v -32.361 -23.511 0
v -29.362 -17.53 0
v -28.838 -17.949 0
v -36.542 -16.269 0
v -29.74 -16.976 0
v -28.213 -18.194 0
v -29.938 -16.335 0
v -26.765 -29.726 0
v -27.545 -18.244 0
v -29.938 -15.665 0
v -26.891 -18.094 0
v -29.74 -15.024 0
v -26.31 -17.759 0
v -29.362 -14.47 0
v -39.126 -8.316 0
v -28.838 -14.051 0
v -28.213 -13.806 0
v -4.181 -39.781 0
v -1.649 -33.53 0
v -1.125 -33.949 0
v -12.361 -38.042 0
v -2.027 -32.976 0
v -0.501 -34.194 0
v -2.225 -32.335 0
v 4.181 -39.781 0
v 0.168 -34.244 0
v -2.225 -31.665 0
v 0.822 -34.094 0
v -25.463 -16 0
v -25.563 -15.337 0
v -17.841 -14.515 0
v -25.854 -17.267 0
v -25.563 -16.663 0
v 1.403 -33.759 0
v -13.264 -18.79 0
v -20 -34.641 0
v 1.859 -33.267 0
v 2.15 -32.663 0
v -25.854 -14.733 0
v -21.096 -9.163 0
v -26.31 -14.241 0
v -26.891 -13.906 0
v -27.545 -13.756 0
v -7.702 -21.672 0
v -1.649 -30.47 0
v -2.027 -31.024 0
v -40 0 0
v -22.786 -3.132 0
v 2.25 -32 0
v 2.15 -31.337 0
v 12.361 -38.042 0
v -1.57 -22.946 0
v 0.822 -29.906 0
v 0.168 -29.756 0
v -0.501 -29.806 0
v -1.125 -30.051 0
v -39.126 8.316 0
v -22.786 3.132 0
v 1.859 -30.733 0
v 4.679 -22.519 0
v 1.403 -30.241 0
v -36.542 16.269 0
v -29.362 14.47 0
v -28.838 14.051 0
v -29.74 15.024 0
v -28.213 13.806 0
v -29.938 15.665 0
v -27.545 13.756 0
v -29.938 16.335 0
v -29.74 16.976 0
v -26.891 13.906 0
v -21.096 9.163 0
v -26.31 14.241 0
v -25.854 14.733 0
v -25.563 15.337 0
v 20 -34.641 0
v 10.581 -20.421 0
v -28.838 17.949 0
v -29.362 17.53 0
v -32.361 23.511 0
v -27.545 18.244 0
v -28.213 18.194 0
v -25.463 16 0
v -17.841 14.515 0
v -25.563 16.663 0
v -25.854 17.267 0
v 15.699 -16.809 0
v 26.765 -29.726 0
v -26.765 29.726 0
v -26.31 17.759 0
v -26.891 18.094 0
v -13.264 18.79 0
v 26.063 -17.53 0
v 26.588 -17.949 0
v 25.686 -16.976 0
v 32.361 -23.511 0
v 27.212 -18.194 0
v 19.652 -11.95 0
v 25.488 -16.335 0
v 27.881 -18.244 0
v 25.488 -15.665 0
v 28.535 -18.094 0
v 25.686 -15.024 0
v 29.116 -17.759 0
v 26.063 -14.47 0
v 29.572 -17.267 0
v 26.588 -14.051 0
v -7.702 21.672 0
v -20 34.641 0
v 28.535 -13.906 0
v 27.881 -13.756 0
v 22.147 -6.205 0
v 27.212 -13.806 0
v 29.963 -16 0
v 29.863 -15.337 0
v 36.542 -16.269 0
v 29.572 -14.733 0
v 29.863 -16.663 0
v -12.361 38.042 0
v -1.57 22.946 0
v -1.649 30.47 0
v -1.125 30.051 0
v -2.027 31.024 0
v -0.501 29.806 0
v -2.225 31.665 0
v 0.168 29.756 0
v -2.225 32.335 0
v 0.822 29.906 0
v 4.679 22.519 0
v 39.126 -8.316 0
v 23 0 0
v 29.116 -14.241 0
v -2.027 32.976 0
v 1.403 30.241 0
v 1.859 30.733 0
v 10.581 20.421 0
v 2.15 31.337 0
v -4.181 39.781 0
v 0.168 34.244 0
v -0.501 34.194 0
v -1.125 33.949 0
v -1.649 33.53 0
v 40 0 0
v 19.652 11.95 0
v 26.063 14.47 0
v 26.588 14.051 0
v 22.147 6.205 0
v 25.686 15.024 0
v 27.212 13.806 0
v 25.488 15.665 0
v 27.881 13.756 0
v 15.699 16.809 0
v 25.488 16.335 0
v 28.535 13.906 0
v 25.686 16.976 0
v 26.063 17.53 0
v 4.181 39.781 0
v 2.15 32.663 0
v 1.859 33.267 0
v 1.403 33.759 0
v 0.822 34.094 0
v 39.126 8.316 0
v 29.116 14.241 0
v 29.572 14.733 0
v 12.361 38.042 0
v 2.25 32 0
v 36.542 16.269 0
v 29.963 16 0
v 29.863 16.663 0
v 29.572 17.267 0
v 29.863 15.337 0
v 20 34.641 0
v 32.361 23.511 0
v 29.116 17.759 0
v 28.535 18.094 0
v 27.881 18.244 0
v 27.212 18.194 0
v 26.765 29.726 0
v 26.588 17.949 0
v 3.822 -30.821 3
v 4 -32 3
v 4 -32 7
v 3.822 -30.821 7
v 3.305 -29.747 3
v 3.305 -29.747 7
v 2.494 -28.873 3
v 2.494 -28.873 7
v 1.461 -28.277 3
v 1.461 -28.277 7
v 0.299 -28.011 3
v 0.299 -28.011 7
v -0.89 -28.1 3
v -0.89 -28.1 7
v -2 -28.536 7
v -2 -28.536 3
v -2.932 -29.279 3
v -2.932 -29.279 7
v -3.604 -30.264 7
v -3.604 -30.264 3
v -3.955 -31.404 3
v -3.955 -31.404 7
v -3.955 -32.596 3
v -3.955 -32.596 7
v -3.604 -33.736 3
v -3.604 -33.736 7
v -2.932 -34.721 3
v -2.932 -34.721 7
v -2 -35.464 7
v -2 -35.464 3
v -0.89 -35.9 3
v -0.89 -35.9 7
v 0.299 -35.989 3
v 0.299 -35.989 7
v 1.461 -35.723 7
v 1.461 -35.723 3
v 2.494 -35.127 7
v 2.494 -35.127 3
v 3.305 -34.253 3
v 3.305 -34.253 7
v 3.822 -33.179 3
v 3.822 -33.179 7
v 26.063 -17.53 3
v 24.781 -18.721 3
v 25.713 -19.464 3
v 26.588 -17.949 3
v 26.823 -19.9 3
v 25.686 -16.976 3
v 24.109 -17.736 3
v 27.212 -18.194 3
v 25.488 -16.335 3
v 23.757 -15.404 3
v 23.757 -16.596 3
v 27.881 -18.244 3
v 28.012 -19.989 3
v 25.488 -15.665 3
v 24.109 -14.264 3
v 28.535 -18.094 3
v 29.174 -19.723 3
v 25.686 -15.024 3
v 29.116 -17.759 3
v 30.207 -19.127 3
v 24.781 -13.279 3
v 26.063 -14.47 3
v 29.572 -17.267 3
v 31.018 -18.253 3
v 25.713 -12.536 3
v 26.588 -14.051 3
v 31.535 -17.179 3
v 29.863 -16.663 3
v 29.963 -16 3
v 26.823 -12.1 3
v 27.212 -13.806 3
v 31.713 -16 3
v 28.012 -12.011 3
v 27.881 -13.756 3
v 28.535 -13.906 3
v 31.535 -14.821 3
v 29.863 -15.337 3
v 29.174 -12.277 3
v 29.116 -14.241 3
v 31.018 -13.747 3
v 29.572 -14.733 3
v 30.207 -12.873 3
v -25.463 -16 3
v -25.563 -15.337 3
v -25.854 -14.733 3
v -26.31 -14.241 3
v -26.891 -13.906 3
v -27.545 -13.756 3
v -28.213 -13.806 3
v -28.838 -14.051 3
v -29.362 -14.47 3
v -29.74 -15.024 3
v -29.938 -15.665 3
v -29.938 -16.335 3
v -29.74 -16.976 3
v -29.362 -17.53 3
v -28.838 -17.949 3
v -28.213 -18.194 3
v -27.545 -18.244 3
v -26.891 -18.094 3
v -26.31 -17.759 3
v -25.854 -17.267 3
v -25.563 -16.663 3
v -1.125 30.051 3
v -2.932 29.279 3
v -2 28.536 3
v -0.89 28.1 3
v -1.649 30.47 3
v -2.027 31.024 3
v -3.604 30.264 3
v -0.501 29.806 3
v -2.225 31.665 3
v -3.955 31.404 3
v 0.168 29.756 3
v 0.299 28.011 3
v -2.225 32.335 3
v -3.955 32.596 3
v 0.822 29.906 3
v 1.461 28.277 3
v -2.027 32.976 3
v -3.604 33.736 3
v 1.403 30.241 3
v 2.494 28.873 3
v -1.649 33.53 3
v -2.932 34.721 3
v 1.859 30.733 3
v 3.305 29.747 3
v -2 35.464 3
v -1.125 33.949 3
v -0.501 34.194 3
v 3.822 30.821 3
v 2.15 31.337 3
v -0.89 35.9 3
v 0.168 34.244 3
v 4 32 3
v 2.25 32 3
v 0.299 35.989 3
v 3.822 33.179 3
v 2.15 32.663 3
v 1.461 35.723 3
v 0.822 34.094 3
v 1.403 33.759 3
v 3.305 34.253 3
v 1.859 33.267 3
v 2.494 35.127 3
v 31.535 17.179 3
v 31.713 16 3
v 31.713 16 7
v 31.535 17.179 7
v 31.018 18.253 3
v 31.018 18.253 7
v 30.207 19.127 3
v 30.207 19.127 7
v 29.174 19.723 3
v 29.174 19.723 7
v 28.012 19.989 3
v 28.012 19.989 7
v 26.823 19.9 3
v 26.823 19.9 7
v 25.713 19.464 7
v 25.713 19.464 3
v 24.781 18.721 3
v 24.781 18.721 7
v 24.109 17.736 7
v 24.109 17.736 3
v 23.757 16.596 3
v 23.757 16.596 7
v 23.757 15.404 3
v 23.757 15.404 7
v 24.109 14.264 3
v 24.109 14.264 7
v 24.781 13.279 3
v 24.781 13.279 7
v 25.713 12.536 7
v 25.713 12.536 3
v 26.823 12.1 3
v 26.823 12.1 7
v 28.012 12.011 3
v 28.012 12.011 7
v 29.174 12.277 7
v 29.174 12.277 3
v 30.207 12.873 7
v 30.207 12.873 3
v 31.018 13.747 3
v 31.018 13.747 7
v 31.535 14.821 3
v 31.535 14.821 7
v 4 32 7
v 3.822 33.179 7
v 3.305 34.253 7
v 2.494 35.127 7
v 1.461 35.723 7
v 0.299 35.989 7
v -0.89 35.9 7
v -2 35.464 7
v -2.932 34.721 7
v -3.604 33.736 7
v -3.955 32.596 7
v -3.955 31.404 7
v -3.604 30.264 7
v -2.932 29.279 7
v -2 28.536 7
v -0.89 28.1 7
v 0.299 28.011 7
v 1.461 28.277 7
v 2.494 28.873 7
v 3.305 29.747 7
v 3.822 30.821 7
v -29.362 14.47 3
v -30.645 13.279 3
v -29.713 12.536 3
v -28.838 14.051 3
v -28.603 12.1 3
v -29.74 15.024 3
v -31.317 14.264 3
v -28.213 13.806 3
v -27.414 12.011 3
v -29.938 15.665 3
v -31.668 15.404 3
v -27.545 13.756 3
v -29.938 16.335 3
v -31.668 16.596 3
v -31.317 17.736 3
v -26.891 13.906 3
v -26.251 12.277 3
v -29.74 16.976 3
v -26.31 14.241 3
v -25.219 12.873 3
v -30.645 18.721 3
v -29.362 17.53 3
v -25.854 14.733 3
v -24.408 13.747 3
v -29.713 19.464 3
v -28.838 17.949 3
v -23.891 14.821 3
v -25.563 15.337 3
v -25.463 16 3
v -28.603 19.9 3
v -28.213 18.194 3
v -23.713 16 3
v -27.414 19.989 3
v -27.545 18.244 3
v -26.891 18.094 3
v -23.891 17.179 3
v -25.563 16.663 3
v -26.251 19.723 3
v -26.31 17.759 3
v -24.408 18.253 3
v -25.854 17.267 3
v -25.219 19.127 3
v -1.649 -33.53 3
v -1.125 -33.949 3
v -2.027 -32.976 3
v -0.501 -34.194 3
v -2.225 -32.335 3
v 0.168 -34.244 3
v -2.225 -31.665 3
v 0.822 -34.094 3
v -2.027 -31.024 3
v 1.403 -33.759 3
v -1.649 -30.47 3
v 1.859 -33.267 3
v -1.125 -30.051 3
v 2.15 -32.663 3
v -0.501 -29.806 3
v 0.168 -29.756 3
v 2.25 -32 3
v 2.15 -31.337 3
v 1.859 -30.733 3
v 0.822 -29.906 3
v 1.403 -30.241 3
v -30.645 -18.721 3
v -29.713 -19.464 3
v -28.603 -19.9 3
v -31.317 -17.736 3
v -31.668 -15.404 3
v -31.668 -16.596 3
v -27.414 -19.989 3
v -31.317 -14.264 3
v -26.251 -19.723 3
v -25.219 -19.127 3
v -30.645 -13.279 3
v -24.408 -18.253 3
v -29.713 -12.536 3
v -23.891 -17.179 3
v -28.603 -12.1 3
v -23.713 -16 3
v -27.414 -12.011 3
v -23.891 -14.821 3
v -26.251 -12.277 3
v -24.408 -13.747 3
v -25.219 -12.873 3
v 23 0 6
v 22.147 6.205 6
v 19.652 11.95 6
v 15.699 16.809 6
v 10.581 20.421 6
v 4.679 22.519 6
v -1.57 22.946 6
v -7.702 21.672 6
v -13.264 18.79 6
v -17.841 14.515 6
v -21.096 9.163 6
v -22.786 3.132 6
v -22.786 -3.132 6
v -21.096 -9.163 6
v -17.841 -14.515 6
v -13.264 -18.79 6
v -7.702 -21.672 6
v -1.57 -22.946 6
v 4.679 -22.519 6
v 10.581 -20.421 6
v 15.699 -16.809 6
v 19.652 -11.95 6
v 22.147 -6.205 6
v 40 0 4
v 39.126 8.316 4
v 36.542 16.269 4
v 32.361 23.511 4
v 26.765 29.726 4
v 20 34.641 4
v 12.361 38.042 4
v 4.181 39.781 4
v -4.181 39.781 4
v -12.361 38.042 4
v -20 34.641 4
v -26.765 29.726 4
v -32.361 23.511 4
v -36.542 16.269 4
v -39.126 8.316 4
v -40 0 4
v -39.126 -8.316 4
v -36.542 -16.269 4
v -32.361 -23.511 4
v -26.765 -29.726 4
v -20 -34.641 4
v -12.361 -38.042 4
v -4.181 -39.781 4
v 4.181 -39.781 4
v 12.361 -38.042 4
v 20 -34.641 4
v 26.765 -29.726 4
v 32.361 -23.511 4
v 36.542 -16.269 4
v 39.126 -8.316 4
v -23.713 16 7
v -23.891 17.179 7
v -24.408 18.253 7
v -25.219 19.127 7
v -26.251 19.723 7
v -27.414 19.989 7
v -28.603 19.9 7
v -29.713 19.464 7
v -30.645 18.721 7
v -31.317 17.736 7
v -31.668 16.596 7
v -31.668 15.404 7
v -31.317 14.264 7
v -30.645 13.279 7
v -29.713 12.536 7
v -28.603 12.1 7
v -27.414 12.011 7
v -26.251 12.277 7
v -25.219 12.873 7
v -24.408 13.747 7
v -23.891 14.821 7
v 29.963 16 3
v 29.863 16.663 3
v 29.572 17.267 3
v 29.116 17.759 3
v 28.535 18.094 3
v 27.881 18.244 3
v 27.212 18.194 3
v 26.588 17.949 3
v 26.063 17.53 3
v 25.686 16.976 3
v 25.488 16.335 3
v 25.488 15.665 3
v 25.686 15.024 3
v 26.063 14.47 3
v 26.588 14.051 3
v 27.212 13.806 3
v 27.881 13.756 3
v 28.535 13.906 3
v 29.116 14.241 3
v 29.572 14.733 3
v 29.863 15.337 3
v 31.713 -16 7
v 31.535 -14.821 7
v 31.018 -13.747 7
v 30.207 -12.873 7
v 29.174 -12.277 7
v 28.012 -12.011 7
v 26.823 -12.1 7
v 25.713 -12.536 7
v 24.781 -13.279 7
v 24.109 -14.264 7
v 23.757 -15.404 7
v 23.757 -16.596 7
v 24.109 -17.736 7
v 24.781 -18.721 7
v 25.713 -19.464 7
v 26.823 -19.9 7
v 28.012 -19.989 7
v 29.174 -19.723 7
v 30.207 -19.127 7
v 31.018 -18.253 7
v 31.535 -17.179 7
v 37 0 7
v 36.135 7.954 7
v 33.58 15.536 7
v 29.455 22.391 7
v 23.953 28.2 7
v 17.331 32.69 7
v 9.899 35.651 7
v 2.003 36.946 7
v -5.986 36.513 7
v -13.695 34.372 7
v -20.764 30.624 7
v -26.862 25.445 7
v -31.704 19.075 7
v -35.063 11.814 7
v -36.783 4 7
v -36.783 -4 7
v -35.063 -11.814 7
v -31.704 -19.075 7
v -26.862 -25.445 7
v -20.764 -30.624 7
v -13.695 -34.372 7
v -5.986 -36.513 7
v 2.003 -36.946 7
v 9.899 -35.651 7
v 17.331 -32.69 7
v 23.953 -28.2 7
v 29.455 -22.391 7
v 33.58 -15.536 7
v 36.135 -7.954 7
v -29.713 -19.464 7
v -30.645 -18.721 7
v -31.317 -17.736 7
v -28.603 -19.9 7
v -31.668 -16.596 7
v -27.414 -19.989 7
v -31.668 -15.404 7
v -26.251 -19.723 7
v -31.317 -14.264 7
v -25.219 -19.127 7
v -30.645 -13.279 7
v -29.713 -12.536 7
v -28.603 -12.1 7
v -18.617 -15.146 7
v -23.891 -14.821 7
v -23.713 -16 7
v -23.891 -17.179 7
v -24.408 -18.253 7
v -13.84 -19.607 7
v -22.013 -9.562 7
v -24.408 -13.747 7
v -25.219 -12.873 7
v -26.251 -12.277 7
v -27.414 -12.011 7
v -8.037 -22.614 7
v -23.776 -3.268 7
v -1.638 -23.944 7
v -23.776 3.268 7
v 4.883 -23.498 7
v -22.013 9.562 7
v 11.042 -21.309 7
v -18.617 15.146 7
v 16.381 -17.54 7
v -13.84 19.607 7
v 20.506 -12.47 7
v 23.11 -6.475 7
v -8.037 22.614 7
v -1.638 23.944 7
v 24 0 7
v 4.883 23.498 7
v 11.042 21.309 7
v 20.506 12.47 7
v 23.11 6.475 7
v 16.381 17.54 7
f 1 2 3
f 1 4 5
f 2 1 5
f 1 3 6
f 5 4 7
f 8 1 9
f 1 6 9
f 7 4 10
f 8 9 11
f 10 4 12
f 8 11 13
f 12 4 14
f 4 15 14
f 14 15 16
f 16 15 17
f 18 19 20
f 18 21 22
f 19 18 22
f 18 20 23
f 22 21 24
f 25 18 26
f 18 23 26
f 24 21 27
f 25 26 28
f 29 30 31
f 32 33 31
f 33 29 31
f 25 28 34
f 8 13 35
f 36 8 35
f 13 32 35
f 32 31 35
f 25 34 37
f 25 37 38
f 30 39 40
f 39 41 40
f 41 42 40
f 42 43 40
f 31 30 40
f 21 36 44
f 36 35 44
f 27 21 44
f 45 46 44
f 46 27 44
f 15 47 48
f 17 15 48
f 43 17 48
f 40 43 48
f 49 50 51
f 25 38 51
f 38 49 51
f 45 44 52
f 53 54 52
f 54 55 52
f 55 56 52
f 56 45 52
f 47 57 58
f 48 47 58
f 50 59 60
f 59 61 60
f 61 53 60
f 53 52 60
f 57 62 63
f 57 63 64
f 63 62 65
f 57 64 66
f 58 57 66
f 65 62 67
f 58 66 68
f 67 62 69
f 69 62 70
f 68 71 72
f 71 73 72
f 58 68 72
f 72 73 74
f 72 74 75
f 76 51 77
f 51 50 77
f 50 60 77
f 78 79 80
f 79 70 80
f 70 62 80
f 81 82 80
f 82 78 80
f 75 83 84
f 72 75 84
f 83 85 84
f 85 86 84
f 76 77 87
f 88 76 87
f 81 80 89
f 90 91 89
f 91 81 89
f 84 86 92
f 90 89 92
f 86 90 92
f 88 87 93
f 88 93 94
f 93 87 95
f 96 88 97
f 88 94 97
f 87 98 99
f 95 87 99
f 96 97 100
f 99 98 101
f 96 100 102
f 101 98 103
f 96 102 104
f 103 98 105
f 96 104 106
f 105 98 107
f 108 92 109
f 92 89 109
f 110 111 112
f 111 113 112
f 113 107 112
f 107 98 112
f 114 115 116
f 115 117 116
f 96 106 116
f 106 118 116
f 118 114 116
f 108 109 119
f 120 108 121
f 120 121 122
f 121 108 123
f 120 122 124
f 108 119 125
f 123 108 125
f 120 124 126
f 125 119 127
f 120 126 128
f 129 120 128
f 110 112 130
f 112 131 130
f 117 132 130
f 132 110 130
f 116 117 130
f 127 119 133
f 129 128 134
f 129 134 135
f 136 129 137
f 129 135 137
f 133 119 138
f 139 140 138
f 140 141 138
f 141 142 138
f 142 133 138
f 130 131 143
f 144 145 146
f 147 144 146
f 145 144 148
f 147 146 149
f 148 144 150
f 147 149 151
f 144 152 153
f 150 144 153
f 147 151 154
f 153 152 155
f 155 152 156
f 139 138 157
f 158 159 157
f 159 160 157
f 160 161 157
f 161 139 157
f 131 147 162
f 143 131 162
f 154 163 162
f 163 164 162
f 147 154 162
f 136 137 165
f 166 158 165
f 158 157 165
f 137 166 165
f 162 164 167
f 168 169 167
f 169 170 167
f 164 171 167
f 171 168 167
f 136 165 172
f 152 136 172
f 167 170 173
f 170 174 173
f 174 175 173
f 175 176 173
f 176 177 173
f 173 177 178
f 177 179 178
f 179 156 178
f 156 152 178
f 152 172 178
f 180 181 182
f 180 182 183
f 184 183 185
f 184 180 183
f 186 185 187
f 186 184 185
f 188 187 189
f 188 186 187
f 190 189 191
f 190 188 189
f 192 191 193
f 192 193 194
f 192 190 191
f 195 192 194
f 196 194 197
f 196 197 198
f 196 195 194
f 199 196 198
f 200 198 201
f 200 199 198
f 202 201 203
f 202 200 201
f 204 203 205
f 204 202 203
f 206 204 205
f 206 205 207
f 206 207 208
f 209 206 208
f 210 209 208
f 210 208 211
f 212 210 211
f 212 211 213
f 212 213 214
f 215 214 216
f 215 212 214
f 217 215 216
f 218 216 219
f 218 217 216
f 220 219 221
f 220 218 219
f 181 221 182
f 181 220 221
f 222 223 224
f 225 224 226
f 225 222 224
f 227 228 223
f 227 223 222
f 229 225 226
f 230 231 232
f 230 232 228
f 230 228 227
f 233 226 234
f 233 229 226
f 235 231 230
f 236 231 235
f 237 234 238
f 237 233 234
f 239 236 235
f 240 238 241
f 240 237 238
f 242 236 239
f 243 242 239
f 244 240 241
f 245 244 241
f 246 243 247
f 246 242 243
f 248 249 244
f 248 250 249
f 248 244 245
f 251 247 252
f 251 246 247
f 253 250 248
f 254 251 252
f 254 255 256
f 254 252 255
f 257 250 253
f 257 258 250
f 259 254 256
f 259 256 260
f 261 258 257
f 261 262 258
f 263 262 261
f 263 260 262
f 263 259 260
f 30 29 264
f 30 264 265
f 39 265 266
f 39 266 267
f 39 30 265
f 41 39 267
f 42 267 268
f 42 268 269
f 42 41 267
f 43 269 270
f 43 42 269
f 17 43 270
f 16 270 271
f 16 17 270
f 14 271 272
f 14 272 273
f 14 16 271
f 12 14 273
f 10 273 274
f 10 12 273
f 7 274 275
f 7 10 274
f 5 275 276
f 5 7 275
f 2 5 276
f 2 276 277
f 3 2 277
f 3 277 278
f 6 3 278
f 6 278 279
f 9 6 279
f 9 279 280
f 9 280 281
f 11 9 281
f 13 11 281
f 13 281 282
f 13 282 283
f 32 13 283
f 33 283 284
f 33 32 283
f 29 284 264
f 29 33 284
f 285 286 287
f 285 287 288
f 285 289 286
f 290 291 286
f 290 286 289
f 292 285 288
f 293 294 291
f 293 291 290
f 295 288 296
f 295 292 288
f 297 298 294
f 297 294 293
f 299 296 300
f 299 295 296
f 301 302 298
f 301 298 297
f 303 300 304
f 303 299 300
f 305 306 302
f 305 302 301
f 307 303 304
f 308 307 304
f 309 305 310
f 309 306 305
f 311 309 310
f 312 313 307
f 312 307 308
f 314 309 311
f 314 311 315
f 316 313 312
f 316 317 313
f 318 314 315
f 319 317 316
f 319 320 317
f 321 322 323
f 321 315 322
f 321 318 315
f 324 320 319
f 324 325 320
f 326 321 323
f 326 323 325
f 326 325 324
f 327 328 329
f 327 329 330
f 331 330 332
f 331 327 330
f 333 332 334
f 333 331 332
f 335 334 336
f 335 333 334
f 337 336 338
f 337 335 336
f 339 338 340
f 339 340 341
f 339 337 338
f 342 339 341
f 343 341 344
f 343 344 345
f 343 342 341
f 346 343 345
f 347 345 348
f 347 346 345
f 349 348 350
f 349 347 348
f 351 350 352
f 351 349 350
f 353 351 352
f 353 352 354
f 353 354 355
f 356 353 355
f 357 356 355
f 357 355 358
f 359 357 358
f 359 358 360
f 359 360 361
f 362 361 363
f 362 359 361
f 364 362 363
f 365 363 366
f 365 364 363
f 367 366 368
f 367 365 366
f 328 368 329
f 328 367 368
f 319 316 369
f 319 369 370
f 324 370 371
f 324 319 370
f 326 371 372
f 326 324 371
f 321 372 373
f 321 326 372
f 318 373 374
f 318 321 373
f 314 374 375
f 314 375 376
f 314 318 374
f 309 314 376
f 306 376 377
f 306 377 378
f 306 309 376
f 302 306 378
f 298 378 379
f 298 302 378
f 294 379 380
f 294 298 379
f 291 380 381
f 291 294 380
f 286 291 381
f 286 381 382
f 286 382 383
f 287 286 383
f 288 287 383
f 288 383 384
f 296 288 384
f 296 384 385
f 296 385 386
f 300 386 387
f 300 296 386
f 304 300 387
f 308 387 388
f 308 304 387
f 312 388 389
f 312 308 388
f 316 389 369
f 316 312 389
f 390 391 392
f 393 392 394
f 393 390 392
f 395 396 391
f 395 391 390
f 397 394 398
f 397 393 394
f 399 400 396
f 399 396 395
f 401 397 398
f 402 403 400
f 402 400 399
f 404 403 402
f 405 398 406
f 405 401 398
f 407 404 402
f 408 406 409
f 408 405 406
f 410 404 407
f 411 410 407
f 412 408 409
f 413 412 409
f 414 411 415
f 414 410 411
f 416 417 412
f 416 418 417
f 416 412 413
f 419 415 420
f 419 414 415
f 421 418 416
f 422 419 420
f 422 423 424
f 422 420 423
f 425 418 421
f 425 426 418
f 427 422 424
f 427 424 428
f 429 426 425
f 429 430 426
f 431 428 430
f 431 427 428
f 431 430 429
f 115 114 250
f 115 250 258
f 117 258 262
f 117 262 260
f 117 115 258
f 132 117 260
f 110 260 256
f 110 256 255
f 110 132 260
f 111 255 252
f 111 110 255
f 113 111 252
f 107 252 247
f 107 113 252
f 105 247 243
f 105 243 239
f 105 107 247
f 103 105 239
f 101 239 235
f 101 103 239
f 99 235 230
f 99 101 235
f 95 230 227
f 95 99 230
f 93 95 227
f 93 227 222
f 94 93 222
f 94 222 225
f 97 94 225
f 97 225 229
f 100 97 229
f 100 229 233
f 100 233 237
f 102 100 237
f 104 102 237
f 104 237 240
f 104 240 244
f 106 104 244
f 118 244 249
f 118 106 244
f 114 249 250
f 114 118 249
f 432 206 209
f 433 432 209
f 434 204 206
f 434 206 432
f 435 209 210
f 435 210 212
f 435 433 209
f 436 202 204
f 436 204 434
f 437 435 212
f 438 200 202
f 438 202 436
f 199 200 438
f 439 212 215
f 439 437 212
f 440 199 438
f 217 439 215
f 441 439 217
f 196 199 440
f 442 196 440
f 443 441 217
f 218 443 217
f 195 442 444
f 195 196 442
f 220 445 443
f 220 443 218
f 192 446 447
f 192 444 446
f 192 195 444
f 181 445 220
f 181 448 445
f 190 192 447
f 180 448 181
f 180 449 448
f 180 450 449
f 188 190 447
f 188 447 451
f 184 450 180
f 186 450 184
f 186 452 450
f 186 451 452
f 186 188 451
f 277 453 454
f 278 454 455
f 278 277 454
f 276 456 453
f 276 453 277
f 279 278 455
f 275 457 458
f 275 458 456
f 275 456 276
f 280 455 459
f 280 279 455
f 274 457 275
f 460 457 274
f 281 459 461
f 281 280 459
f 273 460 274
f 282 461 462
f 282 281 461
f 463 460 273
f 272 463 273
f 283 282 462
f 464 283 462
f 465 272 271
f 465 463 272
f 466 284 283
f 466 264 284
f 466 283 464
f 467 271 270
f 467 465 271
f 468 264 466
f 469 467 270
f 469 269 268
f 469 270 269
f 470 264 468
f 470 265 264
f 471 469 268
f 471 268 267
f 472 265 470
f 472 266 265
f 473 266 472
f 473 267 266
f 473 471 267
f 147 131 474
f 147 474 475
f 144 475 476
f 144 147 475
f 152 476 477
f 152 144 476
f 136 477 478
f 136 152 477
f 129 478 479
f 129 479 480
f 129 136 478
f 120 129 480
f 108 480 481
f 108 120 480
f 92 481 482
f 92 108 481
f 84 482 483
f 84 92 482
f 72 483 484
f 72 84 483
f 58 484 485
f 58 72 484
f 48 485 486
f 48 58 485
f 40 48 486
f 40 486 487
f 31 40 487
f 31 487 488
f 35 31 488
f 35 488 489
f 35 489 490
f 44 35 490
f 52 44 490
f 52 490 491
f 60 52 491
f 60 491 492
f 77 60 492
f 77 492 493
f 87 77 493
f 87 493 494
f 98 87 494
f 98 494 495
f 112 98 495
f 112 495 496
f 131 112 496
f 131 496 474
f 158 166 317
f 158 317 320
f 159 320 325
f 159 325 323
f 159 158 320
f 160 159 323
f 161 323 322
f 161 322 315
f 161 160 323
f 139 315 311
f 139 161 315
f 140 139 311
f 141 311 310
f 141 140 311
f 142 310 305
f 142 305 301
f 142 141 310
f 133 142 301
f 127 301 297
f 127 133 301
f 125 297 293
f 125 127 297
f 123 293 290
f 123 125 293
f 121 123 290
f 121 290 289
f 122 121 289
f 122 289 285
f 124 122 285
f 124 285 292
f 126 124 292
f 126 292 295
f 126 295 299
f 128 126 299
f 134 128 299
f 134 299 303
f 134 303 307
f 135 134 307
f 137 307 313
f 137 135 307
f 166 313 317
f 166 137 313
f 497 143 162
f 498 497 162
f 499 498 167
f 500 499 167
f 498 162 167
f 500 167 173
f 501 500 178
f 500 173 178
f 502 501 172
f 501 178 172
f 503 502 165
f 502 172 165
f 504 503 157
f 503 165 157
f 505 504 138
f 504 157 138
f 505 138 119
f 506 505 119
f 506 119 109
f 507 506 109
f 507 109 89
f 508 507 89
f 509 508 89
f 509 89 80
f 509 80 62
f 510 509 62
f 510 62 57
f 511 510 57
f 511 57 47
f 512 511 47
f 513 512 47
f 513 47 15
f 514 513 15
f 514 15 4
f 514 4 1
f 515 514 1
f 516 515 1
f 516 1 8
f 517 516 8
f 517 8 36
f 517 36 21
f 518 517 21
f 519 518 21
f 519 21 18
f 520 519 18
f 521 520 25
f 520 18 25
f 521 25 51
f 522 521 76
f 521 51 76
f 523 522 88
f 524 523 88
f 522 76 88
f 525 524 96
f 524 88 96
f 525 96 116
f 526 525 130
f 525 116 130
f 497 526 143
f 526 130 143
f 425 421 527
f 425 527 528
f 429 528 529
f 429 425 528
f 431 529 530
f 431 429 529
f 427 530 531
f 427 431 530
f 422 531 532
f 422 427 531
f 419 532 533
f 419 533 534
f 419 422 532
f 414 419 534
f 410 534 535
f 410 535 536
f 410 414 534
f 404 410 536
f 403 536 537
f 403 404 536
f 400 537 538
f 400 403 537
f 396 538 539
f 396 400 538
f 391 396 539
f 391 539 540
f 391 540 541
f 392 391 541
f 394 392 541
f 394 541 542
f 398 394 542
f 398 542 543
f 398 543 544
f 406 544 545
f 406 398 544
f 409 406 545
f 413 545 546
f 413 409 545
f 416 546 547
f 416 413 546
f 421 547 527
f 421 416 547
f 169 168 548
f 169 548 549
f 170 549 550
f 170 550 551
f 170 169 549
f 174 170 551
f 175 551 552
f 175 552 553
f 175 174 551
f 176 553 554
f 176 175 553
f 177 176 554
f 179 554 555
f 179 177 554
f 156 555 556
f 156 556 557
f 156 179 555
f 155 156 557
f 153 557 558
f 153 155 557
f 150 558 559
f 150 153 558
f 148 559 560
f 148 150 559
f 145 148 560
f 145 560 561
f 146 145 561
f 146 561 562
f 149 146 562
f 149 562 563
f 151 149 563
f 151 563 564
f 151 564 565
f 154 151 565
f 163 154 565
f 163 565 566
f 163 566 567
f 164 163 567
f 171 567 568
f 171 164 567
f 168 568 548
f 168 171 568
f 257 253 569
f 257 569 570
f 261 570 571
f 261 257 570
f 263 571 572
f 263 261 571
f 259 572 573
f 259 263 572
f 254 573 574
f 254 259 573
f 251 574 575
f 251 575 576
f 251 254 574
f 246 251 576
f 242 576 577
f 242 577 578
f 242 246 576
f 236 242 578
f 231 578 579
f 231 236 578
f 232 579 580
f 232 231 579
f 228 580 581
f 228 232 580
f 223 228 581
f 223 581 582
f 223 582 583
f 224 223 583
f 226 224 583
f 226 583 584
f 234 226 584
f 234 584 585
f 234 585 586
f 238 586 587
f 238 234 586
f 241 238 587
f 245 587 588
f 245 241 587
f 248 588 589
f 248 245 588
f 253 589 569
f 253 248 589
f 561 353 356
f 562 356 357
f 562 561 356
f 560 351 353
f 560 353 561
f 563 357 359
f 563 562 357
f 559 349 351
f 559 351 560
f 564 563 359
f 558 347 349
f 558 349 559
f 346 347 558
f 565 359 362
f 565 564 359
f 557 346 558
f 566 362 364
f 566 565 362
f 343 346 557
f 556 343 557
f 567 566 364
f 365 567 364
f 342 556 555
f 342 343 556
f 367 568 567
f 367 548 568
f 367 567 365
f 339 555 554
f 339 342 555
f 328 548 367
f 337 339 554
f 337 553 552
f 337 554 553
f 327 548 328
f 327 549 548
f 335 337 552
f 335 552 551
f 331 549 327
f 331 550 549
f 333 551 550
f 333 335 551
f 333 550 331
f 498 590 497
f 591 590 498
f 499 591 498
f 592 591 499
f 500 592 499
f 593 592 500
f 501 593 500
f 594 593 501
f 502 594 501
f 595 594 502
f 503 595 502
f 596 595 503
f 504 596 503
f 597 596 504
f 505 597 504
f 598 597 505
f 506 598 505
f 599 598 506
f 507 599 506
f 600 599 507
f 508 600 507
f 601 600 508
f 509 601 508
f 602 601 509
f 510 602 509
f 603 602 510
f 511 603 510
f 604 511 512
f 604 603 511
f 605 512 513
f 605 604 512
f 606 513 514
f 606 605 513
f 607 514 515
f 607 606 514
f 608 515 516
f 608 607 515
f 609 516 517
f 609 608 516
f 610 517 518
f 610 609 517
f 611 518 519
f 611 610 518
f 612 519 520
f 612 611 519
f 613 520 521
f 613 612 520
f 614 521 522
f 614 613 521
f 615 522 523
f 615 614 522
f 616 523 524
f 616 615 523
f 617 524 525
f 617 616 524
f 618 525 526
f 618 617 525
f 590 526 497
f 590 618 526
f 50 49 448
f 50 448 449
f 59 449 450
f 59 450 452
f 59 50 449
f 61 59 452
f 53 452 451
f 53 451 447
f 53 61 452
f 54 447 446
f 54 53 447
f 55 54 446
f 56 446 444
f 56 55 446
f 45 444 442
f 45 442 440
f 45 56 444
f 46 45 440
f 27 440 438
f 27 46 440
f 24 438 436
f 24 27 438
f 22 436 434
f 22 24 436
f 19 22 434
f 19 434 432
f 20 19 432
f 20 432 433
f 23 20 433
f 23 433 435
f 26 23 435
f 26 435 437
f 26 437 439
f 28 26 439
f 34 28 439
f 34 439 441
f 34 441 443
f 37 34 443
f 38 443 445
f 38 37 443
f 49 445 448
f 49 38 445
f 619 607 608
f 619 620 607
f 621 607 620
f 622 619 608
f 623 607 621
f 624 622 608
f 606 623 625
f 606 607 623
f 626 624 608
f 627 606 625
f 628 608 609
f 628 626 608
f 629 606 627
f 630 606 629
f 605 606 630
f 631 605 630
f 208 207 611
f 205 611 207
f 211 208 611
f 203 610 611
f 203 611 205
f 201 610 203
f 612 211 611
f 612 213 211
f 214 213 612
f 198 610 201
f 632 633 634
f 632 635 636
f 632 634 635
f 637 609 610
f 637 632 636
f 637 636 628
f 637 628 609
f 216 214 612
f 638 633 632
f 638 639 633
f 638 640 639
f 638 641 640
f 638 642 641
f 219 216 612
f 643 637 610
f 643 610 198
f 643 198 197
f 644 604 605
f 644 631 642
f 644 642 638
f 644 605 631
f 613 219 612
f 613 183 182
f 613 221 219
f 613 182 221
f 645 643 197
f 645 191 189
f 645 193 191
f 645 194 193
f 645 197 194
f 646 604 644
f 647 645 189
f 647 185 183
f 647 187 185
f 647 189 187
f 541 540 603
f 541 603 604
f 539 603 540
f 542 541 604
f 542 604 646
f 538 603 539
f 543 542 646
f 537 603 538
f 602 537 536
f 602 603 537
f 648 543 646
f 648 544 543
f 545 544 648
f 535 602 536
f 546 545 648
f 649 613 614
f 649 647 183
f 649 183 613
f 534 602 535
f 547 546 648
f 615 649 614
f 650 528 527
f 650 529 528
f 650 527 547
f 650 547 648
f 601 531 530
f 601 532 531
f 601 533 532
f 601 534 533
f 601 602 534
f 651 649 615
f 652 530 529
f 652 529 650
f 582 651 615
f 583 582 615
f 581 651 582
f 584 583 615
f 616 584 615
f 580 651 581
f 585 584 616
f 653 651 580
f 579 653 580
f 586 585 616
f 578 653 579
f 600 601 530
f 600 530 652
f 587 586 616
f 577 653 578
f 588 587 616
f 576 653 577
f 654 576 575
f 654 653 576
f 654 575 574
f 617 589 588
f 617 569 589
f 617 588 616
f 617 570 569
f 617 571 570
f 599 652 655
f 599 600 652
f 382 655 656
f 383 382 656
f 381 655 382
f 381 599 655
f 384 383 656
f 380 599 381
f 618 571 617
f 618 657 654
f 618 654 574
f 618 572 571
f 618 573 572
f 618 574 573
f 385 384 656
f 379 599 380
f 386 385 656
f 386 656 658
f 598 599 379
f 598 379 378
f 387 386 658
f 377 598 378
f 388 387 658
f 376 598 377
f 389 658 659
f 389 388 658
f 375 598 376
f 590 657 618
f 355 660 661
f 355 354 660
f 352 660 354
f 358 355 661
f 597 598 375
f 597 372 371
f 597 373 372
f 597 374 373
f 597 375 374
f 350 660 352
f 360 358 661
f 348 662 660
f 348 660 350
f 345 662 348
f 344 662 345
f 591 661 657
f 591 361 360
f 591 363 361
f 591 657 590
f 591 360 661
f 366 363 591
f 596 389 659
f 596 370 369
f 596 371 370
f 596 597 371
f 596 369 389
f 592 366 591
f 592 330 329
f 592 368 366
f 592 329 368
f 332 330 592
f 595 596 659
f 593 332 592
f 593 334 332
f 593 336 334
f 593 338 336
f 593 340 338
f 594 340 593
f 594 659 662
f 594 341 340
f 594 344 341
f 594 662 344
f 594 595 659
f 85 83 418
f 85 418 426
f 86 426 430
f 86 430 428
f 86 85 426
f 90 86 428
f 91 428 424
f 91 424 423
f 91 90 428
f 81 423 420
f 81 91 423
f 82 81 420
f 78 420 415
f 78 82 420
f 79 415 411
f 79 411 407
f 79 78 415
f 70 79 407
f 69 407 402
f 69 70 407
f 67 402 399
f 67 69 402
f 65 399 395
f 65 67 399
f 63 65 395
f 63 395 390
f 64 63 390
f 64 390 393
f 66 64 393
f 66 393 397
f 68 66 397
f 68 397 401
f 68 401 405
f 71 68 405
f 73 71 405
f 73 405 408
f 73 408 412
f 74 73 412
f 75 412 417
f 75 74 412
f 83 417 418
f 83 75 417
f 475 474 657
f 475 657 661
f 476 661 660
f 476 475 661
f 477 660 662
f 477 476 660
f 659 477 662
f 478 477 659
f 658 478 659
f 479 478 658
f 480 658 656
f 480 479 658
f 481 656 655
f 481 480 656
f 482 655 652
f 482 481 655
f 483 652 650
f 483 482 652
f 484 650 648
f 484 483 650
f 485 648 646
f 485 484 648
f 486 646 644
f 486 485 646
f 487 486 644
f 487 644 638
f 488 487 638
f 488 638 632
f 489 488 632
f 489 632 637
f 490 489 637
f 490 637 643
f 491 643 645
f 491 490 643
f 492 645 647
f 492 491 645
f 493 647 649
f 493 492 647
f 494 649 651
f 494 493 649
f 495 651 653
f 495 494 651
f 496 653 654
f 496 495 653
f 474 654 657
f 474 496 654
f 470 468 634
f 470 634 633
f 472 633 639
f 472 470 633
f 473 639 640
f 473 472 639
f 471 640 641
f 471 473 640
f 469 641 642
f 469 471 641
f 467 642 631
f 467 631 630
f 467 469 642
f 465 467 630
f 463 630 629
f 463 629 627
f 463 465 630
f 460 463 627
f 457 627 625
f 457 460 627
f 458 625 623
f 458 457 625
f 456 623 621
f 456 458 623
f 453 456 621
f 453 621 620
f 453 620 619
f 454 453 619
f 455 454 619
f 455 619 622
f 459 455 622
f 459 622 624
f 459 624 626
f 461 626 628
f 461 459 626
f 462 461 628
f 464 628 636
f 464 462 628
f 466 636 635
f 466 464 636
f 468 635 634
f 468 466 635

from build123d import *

# Parameters (mm, degrees)
SKETCH_2_R      = 40
SKETCH_2_R_2    = 2.25
SKETCH_2_R_3    = 23
EXTRUDE_1_DEPTH = 3
SKETCH_3_R      = 40
SKETCH_3_R_2    = 4
SKETCH_3_R_3    = 23
EXTRUDE_2_DEPTH = 4
CHAMFER_1_SIZE  = 3
CHAMFER_2_SIZE  = 1


with BuildPart() as part:
    # ｽｹｯﾁ2 → ﾎﾞｽ - 押し出し1 (new body)
    with BuildSketch(Plane.XY):
        Circle(SKETCH_2_R)
        with Locations((0, 32)):
            Circle(SKETCH_2_R_2, mode=Mode.SUBTRACT)
        Circle(SKETCH_2_R_3, mode=Mode.SUBTRACT)
        with Locations((-27.712812921, 16)):
            Circle(SKETCH_2_R_2, mode=Mode.SUBTRACT)
        with Locations((-27.712812921, -16)):
            Circle(SKETCH_2_R_2, mode=Mode.SUBTRACT)
        with Locations((0, -32)):
            Circle(SKETCH_2_R_2, mode=Mode.SUBTRACT)
        with Locations((27.712812921, -16)):
            Circle(SKETCH_2_R_2, mode=Mode.SUBTRACT)
        with Locations((27.712812921, 16)):
            Circle(SKETCH_2_R_2, mode=Mode.SUBTRACT)
    extrude(amount=EXTRUDE_1_DEPTH)

    # ｽｹｯﾁ3 → ﾎﾞｽ - 押し出し2 (add)
    with BuildSketch(Plane.XY.offset(3)):
        Circle(SKETCH_3_R)
        with Locations((0, 32)):
            Circle(SKETCH_3_R_2, mode=Mode.SUBTRACT)
        with Locations((-27.712812921, 16)):
            Circle(SKETCH_3_R_2, mode=Mode.SUBTRACT)
        with Locations((-27.712812921, -16)):
            Circle(SKETCH_3_R_2, mode=Mode.SUBTRACT)
        with Locations((0, -32)):
            Circle(SKETCH_3_R_2, mode=Mode.SUBTRACT)
        with Locations((27.712812921, -16)):
            Circle(SKETCH_3_R_2, mode=Mode.SUBTRACT)
        with Locations((27.712812921, 16)):
            Circle(SKETCH_3_R_2, mode=Mode.SUBTRACT)
        Circle(SKETCH_3_R_3, mode=Mode.SUBTRACT)
    extrude(amount=EXTRUDE_2_DEPTH)

    # 面取り1
    chamfer_1_edges = [part.edges().sort_by_distance(p)[0] for p in [
        (-40, 0, 7),
    ]]
    chamfer(chamfer_1_edges, length=CHAMFER_1_SIZE)

    # 面取り2
    chamfer_2_edges = [part.edges().sort_by_distance(p)[0] for p in [
        (-23, 0, 7),
    ]]
    chamfer(chamfer_2_edges, length=CHAMFER_2_SIZE)


solid = part.part
